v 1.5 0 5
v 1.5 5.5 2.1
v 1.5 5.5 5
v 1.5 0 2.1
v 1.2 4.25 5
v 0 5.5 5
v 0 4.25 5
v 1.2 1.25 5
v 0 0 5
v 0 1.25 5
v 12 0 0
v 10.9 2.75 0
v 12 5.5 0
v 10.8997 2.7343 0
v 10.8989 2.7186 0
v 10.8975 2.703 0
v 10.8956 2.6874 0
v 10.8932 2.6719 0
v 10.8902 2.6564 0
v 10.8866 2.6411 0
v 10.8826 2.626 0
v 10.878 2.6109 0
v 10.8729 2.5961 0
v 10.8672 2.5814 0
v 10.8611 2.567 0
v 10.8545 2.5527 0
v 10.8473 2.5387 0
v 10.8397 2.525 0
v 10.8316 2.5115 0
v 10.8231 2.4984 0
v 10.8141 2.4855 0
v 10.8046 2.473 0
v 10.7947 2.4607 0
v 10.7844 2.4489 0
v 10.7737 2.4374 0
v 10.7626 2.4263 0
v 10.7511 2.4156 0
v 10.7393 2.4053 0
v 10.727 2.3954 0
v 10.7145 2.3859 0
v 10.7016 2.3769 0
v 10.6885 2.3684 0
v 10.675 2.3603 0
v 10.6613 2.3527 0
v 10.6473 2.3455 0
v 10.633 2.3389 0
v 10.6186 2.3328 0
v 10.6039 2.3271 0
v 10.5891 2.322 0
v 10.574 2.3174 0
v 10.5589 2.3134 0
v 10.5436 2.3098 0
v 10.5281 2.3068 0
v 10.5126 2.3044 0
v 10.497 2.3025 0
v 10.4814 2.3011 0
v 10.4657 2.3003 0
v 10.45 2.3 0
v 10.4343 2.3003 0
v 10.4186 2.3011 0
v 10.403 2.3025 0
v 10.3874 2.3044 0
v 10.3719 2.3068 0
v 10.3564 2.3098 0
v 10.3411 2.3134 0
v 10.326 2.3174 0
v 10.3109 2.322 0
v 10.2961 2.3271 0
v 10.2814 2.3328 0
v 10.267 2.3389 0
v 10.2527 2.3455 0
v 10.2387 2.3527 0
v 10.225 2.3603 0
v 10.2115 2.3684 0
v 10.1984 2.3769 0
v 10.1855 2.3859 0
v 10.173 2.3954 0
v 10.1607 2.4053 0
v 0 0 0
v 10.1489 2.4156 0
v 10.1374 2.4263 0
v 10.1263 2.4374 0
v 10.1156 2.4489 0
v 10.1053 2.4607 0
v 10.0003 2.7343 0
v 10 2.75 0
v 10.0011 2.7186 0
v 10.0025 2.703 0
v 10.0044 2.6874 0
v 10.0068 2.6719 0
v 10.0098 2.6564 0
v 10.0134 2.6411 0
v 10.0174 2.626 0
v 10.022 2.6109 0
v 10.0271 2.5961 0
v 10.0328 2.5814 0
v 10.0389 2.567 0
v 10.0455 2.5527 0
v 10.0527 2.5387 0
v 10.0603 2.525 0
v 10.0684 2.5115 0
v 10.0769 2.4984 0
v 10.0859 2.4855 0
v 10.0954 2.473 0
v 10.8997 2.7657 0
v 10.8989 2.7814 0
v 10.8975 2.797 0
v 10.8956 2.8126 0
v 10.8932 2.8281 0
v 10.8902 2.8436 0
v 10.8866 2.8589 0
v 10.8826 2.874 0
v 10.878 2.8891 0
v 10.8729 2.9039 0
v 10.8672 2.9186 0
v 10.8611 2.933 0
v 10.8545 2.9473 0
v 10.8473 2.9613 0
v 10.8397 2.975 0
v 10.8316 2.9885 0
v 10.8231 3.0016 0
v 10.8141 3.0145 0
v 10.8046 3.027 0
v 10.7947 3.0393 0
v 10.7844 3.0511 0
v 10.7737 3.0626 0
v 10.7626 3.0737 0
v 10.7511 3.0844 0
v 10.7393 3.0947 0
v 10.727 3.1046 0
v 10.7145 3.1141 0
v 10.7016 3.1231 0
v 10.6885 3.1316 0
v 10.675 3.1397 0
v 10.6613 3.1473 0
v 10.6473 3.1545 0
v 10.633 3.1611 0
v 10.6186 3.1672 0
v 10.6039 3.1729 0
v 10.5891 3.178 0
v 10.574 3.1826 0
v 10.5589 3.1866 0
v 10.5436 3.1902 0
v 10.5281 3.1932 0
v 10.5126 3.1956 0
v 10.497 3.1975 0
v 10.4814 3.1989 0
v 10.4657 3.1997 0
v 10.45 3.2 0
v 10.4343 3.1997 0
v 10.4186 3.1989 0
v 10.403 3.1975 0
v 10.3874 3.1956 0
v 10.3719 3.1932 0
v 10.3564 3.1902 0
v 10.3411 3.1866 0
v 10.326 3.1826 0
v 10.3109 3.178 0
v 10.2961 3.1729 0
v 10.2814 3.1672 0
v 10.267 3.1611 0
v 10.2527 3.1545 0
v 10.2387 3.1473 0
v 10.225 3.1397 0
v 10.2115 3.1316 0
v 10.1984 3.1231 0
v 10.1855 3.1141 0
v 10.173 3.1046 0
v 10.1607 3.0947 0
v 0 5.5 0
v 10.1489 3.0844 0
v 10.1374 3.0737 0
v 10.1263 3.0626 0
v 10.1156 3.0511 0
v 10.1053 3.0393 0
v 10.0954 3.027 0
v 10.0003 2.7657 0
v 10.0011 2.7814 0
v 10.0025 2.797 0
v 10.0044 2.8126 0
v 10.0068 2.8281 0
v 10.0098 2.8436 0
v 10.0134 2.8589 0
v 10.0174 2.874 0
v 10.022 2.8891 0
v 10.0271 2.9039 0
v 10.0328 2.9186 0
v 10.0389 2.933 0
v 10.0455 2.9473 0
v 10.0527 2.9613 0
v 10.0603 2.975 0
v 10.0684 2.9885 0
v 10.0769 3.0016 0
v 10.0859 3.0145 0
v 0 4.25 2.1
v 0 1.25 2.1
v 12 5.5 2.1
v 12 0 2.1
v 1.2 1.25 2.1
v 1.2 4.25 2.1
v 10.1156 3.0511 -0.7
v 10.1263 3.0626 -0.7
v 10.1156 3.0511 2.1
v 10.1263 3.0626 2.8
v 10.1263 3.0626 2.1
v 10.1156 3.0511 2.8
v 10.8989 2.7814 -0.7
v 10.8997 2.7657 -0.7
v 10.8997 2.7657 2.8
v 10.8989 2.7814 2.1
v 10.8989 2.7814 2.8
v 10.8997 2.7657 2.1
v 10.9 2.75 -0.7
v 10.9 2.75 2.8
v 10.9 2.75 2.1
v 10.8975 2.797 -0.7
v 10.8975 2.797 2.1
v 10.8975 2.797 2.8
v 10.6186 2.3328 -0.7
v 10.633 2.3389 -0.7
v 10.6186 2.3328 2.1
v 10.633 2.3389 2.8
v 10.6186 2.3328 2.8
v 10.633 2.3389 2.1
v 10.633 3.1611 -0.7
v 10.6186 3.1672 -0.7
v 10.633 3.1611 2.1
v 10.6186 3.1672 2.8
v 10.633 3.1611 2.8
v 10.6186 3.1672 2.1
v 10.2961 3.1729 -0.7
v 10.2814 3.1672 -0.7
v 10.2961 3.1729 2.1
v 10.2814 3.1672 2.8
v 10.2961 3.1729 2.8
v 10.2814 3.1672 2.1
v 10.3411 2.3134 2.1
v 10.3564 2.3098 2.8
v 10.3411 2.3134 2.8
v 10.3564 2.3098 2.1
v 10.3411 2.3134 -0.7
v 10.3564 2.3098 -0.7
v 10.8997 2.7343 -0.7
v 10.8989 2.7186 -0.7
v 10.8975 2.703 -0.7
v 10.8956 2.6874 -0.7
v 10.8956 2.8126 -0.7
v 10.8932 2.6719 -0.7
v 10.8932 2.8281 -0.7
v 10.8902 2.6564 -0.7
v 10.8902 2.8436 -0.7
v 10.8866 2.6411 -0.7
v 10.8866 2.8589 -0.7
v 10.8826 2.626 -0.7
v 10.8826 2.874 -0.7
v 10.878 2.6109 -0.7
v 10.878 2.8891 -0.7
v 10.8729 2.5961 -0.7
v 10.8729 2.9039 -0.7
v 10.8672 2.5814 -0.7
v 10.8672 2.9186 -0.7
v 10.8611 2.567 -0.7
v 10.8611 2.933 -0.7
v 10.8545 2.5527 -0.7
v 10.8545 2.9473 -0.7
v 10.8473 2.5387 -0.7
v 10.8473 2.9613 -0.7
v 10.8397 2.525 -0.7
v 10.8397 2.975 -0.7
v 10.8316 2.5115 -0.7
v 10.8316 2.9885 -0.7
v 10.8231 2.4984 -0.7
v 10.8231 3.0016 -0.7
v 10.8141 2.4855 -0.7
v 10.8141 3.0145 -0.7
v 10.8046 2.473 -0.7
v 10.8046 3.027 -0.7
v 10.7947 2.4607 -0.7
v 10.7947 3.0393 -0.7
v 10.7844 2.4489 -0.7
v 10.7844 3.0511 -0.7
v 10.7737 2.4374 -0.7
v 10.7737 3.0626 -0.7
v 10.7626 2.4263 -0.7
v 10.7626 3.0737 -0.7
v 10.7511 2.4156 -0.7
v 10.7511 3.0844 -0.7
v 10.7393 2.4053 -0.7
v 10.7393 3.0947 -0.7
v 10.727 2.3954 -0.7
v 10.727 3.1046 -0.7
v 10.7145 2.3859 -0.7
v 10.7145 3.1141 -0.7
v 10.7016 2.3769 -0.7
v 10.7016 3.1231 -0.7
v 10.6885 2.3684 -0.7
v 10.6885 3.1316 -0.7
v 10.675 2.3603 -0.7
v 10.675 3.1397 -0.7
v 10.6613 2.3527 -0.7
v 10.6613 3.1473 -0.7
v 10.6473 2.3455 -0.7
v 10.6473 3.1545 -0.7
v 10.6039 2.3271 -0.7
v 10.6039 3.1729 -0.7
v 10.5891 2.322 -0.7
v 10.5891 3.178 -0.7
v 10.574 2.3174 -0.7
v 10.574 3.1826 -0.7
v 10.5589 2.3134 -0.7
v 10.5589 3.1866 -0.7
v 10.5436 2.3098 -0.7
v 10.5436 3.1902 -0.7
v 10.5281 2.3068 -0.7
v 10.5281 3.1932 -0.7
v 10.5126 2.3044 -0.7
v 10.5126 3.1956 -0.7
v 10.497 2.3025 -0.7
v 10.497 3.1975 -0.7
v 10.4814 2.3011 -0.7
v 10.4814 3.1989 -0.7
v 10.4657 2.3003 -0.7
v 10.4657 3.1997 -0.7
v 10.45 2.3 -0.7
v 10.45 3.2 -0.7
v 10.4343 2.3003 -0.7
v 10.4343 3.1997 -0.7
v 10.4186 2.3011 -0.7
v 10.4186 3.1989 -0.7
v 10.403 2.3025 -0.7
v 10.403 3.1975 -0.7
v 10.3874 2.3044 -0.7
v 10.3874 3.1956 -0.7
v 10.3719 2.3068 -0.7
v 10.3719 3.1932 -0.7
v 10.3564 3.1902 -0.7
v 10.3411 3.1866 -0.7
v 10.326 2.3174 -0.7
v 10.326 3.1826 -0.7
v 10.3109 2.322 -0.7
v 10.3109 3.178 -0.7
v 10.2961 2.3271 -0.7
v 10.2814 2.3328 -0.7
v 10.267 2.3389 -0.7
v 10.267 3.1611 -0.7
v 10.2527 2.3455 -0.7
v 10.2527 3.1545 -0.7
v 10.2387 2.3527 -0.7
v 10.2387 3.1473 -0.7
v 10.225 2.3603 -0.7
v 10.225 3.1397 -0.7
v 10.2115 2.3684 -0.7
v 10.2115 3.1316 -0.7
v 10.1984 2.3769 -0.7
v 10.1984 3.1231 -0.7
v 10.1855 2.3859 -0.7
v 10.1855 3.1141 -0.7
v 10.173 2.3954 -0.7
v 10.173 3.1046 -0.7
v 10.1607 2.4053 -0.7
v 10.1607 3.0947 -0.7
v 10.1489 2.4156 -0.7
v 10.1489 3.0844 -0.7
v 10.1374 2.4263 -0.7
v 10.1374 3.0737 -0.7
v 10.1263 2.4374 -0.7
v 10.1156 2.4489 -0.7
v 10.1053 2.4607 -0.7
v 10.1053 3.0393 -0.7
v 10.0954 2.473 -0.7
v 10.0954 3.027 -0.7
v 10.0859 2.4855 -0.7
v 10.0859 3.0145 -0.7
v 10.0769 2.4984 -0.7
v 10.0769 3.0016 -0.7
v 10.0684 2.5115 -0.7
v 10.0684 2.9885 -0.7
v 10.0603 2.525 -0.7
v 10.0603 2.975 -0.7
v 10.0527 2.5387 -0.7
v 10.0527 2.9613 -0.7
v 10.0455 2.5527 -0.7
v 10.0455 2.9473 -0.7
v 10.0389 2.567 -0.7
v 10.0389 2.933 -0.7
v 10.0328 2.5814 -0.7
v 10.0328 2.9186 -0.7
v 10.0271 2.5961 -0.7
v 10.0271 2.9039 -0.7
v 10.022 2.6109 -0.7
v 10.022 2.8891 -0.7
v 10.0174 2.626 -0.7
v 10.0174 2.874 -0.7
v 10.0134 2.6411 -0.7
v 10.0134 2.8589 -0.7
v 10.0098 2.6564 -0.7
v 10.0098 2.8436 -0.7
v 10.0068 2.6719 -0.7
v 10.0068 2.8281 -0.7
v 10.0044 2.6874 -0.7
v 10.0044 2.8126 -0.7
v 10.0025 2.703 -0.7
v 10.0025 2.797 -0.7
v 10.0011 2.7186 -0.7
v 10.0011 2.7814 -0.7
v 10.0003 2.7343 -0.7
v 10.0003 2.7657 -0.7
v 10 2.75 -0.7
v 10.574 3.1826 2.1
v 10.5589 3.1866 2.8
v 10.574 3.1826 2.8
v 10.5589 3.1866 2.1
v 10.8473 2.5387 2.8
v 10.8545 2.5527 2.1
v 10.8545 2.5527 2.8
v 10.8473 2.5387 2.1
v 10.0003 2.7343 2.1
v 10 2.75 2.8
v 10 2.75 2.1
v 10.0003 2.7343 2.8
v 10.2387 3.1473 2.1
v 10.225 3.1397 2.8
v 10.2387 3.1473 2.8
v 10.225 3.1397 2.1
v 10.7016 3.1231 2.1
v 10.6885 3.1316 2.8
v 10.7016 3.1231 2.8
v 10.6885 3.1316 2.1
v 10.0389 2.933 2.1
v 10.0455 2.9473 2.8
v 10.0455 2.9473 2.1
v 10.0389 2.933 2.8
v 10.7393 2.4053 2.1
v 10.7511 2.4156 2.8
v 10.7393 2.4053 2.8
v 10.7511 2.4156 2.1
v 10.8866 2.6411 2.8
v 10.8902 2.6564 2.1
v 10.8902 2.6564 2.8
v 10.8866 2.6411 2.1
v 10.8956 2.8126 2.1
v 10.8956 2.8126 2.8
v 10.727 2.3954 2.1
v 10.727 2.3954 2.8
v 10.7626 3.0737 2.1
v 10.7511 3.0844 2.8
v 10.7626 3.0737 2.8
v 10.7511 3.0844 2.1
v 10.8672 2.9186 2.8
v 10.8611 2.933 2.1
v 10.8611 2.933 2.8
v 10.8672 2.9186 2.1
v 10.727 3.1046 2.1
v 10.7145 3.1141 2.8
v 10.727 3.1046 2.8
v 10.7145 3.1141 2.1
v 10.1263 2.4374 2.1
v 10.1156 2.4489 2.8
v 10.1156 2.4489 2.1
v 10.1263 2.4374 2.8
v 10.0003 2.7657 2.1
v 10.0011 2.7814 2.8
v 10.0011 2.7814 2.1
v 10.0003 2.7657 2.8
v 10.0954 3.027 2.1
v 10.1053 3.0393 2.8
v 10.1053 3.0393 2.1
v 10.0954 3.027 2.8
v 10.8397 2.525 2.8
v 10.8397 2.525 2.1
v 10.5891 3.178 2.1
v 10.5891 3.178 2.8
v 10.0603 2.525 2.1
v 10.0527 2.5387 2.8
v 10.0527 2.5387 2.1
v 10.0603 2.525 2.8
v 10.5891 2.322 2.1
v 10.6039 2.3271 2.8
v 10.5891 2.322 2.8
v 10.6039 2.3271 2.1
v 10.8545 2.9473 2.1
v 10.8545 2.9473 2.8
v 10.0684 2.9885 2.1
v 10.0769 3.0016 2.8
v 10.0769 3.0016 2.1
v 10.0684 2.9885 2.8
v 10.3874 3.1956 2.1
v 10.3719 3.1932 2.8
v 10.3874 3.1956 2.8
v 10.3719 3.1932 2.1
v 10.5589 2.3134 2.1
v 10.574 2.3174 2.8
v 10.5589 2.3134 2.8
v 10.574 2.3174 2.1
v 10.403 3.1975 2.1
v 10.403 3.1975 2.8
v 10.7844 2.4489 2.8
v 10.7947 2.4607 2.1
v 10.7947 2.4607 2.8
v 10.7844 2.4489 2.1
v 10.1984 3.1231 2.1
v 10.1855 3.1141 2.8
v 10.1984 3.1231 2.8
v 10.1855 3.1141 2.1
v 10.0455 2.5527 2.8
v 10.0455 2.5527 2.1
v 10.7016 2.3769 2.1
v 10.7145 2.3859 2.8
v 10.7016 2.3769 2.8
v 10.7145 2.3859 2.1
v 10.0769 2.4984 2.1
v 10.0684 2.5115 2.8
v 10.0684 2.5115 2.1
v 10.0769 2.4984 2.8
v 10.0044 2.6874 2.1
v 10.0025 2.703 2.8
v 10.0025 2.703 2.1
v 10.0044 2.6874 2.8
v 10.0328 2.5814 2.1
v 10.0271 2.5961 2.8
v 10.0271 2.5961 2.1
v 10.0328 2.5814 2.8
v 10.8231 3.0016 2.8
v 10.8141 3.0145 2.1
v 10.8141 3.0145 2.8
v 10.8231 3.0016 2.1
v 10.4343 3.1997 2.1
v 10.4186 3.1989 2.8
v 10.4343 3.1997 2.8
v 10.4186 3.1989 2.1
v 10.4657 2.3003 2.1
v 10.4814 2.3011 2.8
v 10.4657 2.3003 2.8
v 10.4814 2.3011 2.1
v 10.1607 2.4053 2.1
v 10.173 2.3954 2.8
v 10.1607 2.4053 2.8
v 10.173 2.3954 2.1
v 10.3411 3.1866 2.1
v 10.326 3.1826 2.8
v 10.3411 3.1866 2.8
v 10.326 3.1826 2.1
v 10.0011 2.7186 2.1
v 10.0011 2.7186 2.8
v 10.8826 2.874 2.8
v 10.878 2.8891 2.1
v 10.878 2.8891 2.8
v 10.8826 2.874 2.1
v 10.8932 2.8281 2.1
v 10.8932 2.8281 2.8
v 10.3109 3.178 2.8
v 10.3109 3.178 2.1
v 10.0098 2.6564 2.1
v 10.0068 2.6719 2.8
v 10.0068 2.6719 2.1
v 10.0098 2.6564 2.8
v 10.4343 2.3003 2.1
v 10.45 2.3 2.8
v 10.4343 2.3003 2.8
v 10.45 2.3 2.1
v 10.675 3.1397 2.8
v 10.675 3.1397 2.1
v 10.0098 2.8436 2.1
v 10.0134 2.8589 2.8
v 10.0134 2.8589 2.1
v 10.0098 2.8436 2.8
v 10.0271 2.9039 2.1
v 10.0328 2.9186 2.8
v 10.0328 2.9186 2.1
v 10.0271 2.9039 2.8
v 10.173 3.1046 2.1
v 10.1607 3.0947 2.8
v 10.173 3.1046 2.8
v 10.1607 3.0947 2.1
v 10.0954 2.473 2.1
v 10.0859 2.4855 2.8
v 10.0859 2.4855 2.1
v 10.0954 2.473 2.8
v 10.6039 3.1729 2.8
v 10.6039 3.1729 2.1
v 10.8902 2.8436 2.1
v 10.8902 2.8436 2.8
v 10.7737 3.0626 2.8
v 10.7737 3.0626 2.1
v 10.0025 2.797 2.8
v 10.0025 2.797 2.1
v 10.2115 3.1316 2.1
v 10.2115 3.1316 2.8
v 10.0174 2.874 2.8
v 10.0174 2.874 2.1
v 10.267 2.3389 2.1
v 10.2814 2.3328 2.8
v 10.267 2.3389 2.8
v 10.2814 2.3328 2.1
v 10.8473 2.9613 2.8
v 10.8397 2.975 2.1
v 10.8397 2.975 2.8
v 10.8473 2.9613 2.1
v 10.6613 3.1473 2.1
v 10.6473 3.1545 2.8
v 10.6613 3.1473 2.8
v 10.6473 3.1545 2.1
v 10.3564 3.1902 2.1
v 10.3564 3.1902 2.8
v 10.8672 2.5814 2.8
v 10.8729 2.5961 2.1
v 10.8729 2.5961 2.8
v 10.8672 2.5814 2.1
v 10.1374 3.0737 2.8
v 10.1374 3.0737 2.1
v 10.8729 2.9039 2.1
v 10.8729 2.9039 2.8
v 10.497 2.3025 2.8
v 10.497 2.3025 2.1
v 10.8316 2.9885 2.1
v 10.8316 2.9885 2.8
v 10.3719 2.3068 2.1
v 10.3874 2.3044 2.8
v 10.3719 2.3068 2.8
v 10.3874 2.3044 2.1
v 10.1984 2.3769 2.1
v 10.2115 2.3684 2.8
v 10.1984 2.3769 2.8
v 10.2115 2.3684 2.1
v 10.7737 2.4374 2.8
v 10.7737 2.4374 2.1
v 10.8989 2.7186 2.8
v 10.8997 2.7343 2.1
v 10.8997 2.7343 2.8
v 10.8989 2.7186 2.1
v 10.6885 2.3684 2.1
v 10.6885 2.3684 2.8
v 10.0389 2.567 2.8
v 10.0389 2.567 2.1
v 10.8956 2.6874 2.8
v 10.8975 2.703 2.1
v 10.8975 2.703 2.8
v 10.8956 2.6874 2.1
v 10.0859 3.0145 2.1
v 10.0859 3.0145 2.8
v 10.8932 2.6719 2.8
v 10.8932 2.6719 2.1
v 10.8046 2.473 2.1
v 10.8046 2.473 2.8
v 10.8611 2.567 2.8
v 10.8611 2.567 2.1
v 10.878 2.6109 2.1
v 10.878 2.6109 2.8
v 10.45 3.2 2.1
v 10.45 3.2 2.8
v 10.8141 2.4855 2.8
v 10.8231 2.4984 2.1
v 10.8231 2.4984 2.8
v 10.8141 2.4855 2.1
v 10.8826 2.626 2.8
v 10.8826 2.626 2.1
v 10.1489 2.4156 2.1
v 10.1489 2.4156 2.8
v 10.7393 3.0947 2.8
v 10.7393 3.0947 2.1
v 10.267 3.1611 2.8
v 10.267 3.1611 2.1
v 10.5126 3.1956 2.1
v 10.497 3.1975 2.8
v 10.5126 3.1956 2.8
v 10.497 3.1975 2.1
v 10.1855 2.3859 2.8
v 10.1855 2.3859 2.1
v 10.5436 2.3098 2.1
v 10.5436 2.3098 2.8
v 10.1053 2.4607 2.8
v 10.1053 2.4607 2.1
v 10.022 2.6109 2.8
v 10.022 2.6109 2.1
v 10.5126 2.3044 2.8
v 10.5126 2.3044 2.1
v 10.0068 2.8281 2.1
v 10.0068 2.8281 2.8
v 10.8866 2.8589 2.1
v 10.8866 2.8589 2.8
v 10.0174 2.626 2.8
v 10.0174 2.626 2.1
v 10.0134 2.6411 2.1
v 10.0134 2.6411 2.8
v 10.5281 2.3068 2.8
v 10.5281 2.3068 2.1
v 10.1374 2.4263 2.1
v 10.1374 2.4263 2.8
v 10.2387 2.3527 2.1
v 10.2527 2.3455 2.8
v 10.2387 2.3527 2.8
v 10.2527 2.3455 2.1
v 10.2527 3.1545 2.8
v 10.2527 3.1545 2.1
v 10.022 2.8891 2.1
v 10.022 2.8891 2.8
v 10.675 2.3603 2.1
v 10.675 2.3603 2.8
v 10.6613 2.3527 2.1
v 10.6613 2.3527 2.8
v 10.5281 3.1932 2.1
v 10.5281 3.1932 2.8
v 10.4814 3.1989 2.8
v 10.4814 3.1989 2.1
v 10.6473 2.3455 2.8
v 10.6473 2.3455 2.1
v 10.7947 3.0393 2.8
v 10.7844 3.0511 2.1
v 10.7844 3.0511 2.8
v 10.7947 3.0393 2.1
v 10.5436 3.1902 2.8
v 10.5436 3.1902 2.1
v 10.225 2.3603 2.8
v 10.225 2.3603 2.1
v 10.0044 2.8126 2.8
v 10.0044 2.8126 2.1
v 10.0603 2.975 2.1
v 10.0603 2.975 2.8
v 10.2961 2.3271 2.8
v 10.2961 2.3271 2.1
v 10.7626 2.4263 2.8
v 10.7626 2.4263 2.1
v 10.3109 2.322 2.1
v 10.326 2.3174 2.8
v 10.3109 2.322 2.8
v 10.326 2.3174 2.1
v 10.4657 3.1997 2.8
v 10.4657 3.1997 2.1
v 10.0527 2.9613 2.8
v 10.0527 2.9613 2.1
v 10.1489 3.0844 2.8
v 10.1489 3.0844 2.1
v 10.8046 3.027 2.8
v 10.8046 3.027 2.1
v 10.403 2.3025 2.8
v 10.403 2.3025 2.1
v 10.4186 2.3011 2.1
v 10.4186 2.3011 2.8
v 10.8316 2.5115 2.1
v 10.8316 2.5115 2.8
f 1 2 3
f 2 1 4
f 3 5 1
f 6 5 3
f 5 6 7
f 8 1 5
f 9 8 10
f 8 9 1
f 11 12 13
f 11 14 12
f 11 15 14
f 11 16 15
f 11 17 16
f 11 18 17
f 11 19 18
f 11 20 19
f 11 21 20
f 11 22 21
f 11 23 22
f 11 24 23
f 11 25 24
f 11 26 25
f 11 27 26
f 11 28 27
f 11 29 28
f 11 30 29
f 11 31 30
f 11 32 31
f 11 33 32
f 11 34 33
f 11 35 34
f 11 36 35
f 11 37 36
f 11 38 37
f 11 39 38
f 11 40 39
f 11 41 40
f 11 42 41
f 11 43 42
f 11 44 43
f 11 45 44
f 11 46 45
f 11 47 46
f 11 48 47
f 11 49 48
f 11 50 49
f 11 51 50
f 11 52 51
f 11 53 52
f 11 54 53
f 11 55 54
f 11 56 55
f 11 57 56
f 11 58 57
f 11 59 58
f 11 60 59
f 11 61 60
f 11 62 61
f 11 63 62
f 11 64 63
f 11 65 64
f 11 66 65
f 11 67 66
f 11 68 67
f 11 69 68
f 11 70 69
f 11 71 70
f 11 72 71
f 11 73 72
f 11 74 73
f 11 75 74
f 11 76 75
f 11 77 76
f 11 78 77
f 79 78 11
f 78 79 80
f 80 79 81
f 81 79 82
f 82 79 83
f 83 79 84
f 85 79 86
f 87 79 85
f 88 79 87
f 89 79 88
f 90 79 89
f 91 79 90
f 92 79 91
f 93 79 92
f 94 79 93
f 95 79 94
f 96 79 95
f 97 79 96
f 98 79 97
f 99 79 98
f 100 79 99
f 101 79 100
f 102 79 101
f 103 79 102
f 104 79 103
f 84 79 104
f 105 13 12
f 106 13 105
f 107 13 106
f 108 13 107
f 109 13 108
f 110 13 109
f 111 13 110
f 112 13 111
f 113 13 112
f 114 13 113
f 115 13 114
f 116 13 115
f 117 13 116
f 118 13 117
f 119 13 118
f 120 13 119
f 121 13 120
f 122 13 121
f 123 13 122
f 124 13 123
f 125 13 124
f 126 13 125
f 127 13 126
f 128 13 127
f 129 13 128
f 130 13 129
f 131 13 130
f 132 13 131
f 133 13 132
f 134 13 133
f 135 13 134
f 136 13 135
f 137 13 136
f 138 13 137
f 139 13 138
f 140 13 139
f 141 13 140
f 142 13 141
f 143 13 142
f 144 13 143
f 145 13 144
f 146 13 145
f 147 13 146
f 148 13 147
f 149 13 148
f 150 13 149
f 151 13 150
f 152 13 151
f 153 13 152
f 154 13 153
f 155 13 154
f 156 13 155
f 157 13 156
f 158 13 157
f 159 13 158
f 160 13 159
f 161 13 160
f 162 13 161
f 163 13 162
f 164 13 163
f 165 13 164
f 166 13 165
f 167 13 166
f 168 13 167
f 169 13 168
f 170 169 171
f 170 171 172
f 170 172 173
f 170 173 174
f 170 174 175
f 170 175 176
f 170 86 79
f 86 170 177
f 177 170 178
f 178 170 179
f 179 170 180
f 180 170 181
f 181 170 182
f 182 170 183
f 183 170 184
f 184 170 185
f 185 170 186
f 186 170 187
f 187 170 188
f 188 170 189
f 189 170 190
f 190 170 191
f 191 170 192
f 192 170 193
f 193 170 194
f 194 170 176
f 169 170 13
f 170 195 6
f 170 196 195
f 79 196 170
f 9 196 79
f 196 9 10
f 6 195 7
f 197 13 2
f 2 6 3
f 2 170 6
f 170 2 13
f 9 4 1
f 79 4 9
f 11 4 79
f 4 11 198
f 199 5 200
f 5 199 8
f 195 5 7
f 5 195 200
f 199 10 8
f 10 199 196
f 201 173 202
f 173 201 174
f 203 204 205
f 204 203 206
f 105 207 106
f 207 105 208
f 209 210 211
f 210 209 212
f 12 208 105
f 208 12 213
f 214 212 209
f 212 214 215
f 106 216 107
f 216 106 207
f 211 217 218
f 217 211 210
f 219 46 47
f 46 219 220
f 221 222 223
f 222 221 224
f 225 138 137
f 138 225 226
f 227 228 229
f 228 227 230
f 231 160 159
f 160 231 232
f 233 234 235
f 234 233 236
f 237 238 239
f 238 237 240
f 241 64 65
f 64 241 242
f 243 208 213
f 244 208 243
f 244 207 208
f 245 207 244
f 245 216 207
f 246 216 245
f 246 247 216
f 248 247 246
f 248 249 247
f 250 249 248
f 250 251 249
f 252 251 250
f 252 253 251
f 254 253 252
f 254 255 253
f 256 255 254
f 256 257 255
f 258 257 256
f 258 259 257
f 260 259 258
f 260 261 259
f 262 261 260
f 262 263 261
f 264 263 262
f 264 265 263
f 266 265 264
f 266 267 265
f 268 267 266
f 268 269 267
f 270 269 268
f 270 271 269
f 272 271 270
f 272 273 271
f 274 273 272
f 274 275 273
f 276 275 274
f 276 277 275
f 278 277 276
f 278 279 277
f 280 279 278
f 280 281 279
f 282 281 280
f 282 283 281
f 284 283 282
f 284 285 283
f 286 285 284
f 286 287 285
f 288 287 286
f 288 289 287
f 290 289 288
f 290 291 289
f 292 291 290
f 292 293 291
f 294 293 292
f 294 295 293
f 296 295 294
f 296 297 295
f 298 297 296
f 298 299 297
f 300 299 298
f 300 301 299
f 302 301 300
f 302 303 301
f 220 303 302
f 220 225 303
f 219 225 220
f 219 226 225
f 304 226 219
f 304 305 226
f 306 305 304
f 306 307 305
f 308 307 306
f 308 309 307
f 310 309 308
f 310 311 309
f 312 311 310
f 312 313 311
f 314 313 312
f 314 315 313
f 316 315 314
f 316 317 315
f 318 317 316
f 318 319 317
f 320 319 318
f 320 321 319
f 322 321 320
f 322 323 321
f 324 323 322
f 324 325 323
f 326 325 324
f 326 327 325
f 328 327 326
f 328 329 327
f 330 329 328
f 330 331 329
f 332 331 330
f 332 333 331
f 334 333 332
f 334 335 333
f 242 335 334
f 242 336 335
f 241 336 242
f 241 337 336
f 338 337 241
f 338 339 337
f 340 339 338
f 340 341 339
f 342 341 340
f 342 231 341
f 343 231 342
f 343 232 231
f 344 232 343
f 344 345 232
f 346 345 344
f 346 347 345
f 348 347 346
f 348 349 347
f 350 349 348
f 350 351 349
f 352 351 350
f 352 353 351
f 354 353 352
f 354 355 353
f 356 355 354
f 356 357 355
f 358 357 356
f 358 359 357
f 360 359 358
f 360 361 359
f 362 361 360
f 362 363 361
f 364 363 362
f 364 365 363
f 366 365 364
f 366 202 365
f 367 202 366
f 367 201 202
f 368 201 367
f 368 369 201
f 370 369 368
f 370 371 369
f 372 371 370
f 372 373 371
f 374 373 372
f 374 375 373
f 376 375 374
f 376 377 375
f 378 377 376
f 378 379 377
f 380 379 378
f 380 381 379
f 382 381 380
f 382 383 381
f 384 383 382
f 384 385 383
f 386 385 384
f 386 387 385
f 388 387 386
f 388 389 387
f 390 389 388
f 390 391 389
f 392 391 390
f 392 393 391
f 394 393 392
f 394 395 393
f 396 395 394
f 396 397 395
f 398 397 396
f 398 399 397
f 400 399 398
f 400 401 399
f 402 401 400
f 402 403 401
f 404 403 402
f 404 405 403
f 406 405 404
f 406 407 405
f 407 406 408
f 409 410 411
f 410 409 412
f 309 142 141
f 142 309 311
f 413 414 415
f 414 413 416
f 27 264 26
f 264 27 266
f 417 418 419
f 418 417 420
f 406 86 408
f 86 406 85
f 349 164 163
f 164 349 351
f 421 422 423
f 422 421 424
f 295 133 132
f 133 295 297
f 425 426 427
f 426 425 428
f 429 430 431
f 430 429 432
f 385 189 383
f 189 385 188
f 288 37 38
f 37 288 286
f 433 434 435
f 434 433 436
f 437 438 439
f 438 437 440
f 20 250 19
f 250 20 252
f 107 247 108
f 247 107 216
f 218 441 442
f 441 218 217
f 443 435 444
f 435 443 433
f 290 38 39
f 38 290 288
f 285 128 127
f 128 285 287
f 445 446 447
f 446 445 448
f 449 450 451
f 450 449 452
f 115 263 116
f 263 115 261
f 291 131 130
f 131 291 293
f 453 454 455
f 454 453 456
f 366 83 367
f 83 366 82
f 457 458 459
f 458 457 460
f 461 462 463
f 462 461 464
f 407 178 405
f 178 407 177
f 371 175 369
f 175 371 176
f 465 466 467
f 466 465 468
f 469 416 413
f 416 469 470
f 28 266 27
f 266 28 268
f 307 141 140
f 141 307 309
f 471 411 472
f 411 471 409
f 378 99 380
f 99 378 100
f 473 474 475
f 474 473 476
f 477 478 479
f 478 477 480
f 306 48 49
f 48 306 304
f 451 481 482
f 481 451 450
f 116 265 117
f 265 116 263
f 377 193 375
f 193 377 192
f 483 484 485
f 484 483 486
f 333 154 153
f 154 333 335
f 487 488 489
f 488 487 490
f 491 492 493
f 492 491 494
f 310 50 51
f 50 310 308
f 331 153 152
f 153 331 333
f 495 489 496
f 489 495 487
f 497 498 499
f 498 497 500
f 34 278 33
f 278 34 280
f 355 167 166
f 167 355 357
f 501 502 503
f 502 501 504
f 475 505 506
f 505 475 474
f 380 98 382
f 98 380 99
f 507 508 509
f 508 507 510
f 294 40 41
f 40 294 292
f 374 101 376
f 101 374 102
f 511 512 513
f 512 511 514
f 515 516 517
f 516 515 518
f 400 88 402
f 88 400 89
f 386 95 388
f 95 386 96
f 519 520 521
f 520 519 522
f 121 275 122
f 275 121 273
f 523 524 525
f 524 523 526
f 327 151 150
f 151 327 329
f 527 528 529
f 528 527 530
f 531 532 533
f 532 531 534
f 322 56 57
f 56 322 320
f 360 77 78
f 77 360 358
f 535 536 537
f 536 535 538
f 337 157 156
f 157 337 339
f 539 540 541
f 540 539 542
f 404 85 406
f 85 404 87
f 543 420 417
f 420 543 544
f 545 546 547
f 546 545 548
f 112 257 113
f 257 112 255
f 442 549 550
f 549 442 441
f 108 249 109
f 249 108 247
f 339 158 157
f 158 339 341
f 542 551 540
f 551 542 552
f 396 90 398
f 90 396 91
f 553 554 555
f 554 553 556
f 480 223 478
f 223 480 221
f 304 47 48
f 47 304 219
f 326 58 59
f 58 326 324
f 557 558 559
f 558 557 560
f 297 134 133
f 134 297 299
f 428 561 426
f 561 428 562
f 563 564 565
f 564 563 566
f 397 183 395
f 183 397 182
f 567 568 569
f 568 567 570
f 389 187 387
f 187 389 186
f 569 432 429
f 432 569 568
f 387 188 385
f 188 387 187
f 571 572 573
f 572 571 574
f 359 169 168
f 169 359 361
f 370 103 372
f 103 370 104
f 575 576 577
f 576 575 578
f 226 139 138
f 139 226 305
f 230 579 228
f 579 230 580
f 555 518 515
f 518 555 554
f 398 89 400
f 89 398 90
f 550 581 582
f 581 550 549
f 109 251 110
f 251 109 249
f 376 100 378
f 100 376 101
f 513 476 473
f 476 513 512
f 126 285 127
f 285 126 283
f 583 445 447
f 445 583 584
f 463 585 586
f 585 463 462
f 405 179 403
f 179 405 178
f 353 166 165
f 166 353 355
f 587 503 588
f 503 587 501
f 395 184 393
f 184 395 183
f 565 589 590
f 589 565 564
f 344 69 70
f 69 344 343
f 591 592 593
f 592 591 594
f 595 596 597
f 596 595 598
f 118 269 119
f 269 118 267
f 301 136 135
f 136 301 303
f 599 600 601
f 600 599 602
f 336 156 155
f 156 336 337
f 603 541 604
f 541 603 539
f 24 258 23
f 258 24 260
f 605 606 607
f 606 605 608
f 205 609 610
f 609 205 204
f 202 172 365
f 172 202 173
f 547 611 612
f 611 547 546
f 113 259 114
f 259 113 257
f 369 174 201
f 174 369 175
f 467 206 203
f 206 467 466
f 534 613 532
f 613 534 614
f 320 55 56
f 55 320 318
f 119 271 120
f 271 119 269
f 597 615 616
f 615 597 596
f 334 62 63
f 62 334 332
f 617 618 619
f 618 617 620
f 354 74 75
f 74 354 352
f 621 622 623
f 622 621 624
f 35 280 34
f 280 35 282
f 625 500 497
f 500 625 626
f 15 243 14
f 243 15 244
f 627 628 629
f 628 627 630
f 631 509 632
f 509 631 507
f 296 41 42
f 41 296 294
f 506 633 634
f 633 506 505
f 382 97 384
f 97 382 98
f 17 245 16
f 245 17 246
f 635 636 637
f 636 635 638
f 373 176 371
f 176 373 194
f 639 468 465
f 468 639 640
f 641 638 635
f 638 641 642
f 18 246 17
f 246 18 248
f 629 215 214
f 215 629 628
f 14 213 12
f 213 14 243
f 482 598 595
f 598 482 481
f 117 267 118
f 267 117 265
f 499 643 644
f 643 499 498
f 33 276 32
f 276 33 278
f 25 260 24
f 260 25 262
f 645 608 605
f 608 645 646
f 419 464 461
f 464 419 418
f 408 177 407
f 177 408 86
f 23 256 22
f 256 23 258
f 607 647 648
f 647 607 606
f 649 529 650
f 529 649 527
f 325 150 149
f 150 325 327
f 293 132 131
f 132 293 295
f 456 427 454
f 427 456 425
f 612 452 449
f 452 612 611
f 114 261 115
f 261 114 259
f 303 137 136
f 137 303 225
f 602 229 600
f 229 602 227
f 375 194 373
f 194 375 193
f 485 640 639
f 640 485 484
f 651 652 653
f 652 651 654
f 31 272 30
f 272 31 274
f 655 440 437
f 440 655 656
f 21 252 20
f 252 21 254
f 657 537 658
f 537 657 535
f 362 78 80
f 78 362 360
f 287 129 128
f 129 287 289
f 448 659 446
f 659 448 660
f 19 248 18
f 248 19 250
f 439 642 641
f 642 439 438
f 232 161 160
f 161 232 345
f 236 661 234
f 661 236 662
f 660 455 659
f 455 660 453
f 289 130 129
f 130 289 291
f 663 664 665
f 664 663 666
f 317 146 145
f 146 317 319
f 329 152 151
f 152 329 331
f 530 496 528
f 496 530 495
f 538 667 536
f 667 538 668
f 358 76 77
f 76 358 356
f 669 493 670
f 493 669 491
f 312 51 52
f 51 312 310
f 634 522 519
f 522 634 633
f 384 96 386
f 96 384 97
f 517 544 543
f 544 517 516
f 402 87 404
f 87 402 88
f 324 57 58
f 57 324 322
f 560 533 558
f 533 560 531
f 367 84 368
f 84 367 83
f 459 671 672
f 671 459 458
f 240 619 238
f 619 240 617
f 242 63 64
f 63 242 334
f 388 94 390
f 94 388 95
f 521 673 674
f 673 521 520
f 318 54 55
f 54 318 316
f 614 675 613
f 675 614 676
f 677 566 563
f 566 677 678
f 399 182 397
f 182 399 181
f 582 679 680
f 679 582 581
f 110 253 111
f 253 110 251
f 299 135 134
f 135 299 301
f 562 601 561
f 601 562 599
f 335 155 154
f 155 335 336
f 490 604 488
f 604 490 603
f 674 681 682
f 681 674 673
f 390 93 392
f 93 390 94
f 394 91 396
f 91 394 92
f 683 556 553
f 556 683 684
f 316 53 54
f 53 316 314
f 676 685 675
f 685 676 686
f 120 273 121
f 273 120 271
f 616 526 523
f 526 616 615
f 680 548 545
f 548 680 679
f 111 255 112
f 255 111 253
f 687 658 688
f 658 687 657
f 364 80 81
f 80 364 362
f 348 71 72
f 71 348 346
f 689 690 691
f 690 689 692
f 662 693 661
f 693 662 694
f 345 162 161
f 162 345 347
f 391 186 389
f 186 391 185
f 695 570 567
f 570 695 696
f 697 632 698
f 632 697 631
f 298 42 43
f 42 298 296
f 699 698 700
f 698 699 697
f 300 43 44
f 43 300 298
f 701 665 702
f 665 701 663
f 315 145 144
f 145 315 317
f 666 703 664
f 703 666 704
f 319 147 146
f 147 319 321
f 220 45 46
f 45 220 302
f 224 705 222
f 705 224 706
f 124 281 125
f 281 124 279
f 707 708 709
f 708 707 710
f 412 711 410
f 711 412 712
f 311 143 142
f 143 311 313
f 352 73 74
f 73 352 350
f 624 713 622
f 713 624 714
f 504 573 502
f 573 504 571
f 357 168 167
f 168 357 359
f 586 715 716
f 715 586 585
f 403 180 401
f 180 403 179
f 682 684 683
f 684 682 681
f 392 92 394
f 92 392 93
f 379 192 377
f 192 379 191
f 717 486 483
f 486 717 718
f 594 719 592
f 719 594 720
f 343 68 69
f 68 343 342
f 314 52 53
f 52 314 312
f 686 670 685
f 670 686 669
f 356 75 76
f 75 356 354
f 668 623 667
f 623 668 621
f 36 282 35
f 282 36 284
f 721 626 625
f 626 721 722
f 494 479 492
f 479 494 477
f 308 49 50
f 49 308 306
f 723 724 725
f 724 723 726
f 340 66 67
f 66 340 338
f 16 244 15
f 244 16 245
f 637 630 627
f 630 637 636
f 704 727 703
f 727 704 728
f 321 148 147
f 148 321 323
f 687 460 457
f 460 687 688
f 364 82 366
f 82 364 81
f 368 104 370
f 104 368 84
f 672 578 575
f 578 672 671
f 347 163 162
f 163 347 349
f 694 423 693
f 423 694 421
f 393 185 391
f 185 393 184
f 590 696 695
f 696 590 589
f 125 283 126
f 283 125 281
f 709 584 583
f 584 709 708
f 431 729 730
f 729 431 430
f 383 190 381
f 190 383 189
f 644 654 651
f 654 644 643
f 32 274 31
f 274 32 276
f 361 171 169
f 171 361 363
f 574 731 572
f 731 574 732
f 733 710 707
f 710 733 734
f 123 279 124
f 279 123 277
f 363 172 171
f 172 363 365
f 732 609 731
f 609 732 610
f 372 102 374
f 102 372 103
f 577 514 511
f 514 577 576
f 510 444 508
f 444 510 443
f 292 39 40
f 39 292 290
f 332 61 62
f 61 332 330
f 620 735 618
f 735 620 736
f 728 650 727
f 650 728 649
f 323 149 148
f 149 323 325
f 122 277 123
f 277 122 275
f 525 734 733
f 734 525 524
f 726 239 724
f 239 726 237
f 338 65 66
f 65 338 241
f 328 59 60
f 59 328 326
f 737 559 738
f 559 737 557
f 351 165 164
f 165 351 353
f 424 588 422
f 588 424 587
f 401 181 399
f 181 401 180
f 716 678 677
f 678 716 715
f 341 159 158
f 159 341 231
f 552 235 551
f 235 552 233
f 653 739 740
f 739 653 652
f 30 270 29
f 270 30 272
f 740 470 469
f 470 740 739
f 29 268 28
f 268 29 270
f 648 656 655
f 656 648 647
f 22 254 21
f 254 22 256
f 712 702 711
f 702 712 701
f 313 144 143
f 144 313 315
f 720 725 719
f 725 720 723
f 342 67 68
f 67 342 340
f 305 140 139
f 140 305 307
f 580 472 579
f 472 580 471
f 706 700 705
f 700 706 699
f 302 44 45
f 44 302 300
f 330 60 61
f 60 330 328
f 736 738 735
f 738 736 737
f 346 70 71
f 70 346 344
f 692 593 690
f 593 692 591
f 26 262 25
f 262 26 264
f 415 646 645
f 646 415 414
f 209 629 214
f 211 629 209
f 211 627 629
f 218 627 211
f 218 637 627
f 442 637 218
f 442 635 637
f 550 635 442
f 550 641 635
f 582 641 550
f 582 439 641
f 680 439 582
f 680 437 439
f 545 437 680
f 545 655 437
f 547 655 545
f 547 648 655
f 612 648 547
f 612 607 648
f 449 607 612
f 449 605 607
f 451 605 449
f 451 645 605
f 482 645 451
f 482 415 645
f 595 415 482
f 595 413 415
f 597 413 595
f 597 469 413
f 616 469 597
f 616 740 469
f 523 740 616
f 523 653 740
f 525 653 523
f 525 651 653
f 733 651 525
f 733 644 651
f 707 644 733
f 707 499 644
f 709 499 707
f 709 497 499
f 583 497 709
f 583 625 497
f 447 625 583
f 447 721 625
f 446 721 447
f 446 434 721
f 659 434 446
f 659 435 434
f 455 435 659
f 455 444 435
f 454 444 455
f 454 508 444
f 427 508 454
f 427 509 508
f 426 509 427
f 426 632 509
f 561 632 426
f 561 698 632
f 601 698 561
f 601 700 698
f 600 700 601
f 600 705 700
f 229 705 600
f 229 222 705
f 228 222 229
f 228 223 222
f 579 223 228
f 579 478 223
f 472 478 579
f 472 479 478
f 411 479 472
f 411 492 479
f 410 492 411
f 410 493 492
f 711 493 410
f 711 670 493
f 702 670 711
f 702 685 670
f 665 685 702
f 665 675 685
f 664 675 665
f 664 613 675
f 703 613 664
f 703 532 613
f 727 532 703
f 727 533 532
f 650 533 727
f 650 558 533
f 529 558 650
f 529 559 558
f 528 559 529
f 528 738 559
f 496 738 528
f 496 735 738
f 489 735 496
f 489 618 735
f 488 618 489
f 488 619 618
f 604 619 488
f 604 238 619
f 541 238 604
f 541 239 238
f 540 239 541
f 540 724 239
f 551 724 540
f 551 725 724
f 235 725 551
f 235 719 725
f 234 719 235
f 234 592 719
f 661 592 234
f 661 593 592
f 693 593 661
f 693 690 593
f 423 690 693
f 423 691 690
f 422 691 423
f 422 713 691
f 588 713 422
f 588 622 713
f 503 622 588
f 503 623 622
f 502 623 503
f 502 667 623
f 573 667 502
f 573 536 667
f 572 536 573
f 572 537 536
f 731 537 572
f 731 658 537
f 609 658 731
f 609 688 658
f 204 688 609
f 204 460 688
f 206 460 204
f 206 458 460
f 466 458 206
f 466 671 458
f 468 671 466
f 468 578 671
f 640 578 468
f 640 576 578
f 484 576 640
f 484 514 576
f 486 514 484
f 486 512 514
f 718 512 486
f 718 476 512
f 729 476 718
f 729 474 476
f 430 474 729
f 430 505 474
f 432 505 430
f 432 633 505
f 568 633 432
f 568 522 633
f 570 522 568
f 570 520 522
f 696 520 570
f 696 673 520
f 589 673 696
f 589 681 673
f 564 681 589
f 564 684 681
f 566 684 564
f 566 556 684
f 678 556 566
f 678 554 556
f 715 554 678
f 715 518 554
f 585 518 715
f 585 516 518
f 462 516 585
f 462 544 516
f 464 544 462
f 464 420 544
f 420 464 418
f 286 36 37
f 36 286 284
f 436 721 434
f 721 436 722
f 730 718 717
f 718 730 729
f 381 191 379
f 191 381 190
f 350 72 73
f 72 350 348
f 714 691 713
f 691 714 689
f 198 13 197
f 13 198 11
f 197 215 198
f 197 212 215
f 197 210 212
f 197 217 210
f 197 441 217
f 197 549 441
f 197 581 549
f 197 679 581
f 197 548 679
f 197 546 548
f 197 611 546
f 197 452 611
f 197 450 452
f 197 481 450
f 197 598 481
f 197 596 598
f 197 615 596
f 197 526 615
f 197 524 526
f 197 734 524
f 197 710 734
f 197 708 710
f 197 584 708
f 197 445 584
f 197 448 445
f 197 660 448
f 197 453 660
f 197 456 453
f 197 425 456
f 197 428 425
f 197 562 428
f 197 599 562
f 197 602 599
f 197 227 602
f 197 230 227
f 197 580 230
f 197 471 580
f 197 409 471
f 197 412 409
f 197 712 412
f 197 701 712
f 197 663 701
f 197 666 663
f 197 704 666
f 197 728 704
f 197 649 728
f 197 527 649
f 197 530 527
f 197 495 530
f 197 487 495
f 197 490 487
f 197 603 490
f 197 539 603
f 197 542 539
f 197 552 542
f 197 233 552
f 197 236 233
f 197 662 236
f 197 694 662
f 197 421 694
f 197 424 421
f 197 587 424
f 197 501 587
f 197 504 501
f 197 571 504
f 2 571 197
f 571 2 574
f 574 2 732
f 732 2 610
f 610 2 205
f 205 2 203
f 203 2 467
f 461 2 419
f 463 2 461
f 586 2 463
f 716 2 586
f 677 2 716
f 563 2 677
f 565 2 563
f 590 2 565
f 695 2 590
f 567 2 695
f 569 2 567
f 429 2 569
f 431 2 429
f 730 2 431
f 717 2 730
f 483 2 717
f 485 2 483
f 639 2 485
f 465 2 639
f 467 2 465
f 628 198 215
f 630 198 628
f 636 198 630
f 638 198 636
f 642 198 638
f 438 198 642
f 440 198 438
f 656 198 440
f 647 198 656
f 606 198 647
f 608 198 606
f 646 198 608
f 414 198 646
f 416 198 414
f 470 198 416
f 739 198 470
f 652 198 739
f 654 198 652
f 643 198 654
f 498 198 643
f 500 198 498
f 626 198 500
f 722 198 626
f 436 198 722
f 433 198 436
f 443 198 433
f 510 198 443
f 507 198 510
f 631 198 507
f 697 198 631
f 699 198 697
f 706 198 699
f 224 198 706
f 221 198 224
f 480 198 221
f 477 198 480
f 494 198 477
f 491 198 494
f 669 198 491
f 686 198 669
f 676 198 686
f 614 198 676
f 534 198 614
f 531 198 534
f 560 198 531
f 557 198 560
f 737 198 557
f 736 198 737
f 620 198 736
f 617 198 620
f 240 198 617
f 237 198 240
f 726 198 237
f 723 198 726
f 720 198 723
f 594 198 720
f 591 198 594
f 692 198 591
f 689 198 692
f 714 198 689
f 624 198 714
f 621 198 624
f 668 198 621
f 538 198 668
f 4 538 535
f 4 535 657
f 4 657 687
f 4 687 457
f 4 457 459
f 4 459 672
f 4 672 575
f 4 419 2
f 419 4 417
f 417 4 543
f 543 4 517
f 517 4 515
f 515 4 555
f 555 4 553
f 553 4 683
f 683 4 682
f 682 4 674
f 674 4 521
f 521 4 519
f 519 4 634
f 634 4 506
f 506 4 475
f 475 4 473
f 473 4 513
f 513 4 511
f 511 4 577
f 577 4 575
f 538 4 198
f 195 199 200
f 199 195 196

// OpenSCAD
module triangle(l, w, h) {
    polyhedron(
        points=[[0,0,0], [l,0,0], [l,w,0], [0,w,0], [0,w,h], [l,w,h]],
        faces=[[0,1,2,3],[5,4,3,2],[0,4,5,1],[0,3,4],[5,2,1]]
    );
}


// difference() {
//     translate([0,-3,0]) cube([5,16.5+6,1.5],false);
//     translate([2.5,16.5/2,0]) rotate([0,0,0]) cylinder(2,d=1,$fn=180,true);
// }
// translate([0,0,-1.5]) cube([5,2,1.5],false);
// translate([0,16.5-2,-1.5]) cube([5,2,1.5],false);

// translate([5,-3,1.5]) rotate(90) triangle(2,4,13.5);
// translate([0,-3,1.5]) cube([1,2,13.5],false);

// translate([5,16.5+1,1.5]) rotate(90) triangle(2,4,13.5);
#translate([12-(2-0.45),5.5/2,-(3.5-2.1)/2]) rotate([0,0,0]) cylinder(3.5,d=0.9,$fn=180,true);
translate([0,0,0]) cube([12,5.5,2.1],false);
difference() {
    translate([0,0,0]) cube([1.5,5.5,5],false);
    translate([0,2.5/2,0]) cube([1.2,3,5],false);
}
